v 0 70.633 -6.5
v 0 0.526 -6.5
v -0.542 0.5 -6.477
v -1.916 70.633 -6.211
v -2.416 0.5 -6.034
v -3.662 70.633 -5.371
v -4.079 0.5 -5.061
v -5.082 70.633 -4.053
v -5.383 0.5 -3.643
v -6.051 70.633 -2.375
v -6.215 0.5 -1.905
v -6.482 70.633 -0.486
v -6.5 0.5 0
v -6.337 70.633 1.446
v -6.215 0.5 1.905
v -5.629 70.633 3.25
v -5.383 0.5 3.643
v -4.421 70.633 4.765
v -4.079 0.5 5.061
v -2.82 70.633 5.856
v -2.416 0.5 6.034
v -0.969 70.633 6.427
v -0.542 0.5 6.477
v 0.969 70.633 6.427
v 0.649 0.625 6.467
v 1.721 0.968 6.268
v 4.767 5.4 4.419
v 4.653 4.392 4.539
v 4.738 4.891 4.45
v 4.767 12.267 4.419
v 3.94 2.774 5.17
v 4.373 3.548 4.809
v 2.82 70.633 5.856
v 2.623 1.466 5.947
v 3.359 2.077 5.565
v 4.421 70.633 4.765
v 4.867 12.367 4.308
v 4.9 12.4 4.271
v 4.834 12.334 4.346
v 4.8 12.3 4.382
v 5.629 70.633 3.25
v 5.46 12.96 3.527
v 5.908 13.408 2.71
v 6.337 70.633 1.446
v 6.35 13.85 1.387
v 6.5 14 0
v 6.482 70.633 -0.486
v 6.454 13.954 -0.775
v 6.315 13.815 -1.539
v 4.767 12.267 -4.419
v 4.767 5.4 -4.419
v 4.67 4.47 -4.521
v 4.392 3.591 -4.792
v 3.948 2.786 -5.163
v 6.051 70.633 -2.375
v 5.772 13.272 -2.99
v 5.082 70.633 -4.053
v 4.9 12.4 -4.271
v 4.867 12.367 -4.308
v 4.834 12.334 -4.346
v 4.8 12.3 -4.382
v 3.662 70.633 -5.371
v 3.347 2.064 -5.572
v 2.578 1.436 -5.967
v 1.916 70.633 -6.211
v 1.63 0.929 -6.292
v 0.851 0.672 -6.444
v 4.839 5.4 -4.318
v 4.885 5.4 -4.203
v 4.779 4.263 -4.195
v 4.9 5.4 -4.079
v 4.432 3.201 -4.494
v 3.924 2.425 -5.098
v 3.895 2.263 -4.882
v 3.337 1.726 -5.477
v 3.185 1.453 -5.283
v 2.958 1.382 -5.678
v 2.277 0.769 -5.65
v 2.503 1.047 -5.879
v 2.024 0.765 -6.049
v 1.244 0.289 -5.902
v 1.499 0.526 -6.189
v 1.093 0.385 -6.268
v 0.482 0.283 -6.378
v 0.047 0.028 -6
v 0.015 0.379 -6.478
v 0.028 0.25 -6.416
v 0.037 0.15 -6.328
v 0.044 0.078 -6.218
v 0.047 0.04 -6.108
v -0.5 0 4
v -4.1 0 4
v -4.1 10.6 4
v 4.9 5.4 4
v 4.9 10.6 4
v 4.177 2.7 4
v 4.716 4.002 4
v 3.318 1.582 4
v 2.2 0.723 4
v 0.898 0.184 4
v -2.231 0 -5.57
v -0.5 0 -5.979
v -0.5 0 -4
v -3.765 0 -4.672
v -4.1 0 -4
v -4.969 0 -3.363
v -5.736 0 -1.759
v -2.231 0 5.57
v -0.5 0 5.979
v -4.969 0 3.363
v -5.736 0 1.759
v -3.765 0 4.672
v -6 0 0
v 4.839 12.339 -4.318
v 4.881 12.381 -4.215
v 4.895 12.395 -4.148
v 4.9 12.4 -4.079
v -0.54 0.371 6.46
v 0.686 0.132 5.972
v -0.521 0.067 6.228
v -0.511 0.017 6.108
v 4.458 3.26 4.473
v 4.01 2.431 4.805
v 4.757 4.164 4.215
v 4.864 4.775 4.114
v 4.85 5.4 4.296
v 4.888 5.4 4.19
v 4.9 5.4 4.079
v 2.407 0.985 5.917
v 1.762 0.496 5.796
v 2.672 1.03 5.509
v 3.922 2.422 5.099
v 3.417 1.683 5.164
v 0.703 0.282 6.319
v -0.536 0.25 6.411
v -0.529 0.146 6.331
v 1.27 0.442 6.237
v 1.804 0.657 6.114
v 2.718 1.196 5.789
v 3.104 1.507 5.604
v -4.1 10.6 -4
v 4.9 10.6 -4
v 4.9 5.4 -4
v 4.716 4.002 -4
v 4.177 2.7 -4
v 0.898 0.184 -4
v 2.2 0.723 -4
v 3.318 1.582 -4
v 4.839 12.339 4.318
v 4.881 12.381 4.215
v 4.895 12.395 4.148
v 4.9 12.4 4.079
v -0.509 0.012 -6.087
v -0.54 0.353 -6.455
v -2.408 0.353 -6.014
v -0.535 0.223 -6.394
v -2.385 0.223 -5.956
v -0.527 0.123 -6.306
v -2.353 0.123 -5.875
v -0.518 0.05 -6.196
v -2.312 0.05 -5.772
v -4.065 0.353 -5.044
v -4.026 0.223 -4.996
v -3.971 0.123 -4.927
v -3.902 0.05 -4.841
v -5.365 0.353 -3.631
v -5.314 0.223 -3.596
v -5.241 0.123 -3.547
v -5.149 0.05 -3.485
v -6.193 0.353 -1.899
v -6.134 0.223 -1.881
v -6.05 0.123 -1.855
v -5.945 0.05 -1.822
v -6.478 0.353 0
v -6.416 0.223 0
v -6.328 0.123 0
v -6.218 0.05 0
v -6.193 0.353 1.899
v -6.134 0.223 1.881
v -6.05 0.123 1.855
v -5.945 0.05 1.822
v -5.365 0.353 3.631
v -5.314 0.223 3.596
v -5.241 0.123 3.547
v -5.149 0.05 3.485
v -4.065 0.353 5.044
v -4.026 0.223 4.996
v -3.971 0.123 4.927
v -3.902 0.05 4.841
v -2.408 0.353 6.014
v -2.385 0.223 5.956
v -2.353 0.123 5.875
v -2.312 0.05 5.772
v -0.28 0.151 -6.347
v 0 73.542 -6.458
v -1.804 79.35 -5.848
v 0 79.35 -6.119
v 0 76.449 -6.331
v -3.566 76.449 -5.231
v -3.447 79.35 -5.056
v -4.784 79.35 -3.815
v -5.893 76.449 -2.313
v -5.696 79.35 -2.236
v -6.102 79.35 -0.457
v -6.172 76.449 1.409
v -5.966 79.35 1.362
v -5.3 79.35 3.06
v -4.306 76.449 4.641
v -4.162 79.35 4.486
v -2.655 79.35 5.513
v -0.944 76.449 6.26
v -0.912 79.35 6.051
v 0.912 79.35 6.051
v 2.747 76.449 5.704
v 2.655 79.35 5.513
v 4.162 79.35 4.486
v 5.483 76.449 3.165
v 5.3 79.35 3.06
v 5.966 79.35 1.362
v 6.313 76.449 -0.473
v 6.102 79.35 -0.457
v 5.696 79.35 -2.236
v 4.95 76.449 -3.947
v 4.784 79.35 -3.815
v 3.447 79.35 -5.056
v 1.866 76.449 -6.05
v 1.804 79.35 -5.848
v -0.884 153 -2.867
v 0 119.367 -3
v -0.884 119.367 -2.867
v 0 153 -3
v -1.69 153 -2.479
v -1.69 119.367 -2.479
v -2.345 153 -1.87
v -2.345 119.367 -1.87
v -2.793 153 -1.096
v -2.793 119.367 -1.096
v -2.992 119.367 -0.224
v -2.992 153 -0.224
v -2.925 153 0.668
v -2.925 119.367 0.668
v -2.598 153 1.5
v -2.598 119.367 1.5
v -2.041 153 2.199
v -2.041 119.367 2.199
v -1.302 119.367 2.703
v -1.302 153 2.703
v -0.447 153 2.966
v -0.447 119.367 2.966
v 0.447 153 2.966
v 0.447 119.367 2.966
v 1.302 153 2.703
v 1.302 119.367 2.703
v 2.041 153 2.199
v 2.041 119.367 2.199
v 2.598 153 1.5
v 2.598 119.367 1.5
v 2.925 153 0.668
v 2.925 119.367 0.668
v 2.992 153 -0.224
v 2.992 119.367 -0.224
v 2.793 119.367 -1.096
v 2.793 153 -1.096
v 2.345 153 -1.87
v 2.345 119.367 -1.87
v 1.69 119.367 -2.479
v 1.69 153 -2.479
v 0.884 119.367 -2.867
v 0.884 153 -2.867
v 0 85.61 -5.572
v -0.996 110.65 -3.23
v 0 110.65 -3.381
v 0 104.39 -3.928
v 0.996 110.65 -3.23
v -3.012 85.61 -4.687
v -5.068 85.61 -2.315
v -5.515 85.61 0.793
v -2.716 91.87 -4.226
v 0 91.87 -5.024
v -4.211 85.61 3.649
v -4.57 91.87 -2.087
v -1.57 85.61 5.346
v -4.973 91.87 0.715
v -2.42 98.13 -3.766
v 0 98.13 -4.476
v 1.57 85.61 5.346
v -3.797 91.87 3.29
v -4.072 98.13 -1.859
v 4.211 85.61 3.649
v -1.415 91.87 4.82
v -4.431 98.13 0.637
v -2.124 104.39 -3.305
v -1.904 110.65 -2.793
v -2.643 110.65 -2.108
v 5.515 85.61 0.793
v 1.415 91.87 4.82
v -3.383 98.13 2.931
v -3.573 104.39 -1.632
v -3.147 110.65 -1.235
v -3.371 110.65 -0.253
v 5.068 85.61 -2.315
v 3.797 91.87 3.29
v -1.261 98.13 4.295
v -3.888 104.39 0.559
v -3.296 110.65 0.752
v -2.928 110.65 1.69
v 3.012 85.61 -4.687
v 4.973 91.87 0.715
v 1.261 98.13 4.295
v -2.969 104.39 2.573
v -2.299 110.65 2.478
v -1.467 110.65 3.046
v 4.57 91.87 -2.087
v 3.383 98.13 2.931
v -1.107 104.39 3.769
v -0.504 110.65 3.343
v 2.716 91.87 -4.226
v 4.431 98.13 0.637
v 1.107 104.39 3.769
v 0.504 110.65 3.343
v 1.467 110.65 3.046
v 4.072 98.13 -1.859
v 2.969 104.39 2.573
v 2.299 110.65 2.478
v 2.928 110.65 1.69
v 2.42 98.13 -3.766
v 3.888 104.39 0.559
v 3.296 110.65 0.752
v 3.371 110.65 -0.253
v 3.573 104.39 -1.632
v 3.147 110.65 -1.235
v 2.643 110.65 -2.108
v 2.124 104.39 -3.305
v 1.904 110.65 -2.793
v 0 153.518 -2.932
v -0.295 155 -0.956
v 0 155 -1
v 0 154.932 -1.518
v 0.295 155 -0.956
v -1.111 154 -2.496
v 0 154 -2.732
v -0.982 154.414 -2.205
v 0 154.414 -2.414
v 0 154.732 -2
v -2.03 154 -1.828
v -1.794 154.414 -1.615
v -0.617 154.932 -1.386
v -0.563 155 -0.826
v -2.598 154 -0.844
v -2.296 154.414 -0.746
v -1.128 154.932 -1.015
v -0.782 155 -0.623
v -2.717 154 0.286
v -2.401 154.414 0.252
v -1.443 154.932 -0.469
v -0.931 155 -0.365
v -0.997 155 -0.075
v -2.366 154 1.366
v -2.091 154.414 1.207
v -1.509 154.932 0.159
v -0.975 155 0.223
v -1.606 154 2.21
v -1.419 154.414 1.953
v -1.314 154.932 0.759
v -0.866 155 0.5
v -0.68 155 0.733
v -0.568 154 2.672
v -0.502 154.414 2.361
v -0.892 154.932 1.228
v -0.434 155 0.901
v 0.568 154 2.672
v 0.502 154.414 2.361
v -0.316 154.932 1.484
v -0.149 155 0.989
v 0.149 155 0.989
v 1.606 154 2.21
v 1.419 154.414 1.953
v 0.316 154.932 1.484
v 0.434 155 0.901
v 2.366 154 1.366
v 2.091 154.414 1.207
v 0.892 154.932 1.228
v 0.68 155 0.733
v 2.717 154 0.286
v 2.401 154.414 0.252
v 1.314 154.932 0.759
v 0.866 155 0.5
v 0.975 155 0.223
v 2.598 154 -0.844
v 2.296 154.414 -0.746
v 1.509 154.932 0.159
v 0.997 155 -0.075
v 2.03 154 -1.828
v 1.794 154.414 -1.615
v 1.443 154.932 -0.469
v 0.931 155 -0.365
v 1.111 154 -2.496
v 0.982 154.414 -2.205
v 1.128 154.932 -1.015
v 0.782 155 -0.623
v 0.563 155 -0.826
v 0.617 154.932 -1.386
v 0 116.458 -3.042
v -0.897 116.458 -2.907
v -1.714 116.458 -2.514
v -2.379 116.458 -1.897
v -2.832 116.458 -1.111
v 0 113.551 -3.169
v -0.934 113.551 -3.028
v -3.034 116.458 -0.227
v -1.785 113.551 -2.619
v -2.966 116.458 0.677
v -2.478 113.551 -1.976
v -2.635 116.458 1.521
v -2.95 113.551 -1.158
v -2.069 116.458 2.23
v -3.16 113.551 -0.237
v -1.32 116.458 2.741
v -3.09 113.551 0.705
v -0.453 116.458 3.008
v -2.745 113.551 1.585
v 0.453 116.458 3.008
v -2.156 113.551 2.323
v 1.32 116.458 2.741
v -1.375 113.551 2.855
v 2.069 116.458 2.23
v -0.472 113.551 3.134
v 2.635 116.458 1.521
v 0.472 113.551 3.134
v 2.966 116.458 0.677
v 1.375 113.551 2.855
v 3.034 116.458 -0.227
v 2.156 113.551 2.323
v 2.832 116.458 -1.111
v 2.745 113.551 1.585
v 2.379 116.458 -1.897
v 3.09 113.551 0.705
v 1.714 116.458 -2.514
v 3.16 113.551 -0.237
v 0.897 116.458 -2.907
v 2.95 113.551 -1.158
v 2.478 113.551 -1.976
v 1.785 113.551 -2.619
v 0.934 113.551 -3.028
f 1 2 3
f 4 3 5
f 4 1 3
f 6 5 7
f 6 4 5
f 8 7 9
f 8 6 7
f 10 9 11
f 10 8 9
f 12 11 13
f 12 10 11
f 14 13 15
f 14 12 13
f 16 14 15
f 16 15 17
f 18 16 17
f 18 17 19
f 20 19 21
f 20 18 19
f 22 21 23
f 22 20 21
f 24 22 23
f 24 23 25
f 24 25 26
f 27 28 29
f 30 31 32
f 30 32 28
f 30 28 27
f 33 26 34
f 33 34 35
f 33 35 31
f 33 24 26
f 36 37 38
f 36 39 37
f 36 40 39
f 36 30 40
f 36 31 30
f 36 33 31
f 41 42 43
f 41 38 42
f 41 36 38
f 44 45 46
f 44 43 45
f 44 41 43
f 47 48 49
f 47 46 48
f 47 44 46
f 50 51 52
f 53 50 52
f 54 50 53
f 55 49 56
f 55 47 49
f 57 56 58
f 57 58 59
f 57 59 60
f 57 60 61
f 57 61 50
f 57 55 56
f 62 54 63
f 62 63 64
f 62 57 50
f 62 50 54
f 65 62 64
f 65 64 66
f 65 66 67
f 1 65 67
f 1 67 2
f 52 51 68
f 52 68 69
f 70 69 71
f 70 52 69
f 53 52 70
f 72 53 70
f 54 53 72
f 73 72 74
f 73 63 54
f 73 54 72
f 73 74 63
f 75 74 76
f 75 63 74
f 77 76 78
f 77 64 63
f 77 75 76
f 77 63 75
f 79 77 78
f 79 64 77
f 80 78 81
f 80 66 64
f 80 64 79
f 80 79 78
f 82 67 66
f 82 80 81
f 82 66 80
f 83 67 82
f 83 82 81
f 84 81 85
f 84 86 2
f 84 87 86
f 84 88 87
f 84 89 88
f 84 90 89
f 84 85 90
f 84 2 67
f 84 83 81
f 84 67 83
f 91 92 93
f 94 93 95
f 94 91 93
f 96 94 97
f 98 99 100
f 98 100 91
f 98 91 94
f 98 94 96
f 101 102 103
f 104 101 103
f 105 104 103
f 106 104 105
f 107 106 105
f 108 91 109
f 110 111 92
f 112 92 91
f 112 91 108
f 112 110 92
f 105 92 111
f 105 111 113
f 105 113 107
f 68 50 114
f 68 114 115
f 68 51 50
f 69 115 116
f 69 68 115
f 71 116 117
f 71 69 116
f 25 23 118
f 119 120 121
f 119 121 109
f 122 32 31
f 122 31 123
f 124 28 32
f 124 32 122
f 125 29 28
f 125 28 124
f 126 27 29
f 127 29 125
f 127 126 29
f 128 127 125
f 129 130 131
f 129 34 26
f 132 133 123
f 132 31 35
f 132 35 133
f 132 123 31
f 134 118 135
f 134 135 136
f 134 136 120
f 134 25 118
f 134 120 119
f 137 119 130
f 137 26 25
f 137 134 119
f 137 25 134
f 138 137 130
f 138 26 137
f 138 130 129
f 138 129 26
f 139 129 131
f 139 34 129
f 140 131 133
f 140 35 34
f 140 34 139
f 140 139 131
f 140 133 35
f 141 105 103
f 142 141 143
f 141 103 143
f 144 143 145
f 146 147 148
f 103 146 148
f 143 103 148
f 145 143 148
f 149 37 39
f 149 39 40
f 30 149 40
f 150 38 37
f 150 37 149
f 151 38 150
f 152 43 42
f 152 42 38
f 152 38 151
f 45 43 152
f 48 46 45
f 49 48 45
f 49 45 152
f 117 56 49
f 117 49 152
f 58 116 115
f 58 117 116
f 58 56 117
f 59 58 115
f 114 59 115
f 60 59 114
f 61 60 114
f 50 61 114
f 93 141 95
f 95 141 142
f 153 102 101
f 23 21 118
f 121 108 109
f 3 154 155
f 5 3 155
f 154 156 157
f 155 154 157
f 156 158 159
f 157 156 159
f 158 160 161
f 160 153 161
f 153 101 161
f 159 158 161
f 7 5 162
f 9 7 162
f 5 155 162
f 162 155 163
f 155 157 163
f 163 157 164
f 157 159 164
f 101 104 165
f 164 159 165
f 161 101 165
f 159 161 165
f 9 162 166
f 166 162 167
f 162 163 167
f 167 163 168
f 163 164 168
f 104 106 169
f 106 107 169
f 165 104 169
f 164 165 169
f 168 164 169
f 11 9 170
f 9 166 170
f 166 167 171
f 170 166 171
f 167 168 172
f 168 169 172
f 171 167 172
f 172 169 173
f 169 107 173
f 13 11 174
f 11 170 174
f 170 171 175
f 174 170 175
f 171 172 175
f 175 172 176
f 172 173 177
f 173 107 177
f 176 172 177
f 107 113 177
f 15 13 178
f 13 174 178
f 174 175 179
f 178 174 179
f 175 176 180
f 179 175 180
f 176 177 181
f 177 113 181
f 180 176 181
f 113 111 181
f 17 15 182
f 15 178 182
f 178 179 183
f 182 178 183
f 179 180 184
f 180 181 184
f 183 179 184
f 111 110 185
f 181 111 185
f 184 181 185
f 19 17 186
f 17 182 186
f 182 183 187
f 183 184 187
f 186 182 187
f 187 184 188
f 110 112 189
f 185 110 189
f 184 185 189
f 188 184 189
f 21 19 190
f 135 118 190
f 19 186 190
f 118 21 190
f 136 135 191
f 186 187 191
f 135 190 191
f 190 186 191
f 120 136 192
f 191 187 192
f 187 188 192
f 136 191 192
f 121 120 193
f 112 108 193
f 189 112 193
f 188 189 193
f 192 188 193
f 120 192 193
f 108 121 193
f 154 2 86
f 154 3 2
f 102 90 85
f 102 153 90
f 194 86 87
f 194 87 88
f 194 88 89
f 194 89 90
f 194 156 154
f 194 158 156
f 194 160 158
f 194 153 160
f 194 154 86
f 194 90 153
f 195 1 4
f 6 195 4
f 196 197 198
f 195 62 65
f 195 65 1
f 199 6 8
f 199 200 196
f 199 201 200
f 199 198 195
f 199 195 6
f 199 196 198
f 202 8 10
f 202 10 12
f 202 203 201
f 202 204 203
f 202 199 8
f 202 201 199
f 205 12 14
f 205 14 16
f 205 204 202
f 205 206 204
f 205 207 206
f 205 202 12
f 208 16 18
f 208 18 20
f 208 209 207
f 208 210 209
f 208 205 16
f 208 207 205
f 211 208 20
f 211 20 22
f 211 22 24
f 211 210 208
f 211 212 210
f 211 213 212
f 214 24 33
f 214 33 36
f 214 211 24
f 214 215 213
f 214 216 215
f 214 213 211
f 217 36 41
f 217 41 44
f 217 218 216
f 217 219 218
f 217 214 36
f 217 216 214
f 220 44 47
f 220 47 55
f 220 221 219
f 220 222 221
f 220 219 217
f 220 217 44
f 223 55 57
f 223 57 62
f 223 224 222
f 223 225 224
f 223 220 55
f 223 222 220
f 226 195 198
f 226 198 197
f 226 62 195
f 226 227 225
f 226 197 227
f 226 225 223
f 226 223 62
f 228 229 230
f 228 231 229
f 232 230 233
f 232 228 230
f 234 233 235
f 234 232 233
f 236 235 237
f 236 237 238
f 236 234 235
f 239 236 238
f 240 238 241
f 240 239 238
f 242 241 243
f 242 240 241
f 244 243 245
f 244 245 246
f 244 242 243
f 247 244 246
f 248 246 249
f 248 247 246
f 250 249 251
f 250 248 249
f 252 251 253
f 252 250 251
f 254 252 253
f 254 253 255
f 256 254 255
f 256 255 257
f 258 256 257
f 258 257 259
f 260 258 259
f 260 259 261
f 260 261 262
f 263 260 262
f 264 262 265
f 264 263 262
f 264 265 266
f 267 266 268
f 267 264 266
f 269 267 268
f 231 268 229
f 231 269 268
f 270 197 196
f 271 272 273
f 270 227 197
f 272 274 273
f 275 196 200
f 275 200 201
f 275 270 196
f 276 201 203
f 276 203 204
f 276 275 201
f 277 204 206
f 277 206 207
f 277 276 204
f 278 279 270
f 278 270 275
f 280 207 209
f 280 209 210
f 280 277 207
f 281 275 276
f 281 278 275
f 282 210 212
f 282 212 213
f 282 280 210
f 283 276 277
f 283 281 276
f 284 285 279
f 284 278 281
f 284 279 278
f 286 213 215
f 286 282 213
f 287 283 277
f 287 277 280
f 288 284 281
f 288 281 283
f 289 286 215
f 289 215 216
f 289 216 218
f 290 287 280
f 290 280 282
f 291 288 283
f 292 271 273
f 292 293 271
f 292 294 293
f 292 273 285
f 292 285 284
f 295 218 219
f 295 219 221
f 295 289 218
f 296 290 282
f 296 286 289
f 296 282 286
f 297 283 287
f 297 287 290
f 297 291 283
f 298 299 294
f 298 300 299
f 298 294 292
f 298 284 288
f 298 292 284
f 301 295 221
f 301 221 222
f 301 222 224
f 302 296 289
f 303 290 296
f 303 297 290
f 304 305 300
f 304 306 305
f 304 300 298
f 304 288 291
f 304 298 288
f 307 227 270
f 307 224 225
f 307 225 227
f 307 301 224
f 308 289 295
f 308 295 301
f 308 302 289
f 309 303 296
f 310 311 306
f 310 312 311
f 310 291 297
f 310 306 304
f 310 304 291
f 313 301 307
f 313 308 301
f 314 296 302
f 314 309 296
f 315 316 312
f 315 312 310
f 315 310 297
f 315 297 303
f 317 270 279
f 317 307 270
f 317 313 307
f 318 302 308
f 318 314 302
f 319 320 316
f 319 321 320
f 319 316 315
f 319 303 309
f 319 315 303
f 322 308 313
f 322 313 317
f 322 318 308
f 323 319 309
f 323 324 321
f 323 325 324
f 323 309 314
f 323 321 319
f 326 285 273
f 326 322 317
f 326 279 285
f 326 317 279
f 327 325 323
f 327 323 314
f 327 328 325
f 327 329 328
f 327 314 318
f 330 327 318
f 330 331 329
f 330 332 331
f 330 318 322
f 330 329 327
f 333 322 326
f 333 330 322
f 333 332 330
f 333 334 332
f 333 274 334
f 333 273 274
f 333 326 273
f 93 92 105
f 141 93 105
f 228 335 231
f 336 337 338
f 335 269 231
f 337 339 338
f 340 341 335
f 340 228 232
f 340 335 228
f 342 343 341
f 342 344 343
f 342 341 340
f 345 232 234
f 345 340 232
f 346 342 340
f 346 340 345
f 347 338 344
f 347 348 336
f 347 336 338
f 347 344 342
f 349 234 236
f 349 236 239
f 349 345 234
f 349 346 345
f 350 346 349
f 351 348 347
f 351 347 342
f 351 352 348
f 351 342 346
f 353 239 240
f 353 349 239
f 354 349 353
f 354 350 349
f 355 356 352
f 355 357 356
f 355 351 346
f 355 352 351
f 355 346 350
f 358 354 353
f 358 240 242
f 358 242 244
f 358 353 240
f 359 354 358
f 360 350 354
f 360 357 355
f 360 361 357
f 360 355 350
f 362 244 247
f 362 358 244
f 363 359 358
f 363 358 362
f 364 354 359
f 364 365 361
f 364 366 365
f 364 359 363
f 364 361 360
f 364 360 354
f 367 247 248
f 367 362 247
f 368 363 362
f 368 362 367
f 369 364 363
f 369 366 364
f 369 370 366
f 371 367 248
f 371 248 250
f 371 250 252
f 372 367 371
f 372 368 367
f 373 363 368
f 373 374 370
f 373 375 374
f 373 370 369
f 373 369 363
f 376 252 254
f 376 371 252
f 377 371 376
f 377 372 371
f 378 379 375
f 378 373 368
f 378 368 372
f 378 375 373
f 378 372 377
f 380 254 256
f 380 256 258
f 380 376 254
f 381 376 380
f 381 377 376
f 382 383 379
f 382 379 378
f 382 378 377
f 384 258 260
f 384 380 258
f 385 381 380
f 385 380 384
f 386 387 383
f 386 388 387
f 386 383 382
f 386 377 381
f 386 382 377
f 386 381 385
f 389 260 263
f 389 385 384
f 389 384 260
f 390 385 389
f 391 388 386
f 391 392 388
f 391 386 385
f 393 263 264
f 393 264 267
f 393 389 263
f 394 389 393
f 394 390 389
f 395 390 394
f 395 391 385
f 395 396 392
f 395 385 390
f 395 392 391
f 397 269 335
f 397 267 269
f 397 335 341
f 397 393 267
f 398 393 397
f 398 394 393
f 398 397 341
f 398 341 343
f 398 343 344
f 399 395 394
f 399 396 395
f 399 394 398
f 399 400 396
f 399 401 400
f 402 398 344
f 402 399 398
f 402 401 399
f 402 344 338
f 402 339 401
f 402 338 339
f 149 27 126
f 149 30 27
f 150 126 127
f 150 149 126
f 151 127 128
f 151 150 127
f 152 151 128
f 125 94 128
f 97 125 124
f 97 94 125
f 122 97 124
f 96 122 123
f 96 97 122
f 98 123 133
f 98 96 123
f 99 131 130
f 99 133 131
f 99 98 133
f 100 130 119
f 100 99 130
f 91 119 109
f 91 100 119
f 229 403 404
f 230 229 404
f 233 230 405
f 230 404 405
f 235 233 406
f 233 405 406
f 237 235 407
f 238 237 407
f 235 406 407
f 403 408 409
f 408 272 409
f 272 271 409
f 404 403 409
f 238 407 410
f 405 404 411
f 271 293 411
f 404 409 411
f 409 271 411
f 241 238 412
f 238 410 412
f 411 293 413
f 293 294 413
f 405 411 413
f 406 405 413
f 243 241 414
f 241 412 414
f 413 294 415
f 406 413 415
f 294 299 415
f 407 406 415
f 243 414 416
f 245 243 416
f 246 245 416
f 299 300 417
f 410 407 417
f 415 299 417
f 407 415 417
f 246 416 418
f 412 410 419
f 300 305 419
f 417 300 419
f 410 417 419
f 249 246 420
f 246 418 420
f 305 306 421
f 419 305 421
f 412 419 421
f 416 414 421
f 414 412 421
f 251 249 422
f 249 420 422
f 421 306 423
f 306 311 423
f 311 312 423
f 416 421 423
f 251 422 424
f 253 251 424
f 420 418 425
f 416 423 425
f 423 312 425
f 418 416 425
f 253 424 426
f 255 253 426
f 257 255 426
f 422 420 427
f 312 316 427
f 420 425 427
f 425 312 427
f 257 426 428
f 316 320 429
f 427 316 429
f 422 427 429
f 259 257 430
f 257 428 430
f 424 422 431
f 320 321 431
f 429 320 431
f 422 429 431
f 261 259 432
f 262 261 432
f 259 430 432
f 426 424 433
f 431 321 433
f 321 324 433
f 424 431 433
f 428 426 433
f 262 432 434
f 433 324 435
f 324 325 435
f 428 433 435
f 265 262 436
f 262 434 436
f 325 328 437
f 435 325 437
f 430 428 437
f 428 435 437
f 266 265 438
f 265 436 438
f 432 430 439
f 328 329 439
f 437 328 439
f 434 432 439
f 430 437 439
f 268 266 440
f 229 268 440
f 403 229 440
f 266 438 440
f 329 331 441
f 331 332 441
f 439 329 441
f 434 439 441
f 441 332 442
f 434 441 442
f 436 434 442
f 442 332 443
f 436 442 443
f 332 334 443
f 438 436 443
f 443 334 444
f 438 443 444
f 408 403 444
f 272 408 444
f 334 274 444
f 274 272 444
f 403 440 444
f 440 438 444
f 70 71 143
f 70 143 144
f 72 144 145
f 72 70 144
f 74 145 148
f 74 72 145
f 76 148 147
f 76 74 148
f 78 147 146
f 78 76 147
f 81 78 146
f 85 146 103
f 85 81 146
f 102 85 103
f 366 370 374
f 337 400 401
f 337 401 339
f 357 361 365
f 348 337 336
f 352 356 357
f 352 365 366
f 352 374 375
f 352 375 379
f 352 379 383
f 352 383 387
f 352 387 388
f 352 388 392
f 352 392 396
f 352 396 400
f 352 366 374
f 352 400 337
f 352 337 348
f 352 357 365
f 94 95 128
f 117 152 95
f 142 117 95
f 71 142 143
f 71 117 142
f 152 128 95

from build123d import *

# Parameters (mm, degrees)
FILLET1_R               = 2
FILLET2_R               = 100
CUT_EXTRUDE1_DEPTH      = 156.272341396
CUT_EXTRUDE1_DEPTH_BACK = 156.272341396
SKETCH3_W               = 11
SKETCH3_H               = 8
CUT_EXTRUDE2_DEPTH      = 10.6
FILLET3_R               = 0.5


with BuildPart() as part:
    # Sketch1 → Revolve1 (revolve)
    with BuildSketch(Plane.XY, mode=Mode.PRIVATE) as revolve1_sk:
        Polygon((6.5, 0), (6.5, 75), (3, 115), (3, 155), (0, 155), (0, 0), align=None)
    revolve(revolve1_sk.sketch.rotate(Axis((0, 0, 0), (0, 1, 0)), 90), axis=Axis((0, 0, 0), (0, 1, 0)))

    # Fillet1
    fillet1_edges = [part.edges().sort_by_distance(p)[0] for p in [
        (0, 155, 3),
    ]]
    fillet(fillet1_edges, radius=FILLET1_R)

    # Fillet2
    # the kernel refuses this fillet: 100 mm, written as the material it adds along each edge
    with BuildSketch(Plane(origin=(0, 115, 0), x_dir=(0, 0, -1), z_dir=(1, 0, 0))) as fillet2_piece_1:
        with BuildLine():
            CenterArc((3 + FILLET2_R, FILLET2_R * 0.0436665788079), FILLET2_R, 180, 5.000644598)
            Line((3 + FILLET2_R * 0.00380628250389, -FILLET2_R * 0.043500371473), (3 - FILLET2_R * 0.016117591846, -FILLET2_R * 0.0452437104786))
            Line((3 - FILLET2_R * 0.016117591846, -FILLET2_R * 0.0452437104786), (3 - FILLET2_R * 0.0199238743499, -FILLET2_R * 0.00174333900562))
            Line((3 - FILLET2_R * 0.0199238743499, -FILLET2_R * 0.00174333900562), (3 - FILLET2_R * 0.02, 0))
            Line((3 - FILLET2_R * 0.02, 0), (3 - FILLET2_R * 0.02, FILLET2_R * 0.0436665788079))
            Line((3 - FILLET2_R * 0.02, FILLET2_R * 0.0436665788079), (3, FILLET2_R * 0.0436665788079))
        make_face()
    revolve(axis=Axis((0, 115, 0), (0, 1, 0)))
    # the kernel refuses this fillet: 100 mm, written as the material it takes off along each edge
    with BuildSketch(Plane(origin=(0, 75, 0), x_dir=(0, 0, -1), z_dir=(1, 0, 0))) as fillet2_2_piece_1:
        with BuildLine():
            CenterArc((6.5 - FILLET2_R, -FILLET2_R * 0.0436665788079), FILLET2_R, 0, 5.000644598)
            Line((6.5, -FILLET2_R * 0.0436665788079), (6.5 + FILLET2_R * 0.02, -FILLET2_R * 0.0436665788079))
            Line((6.5 + FILLET2_R * 0.02, -FILLET2_R * 0.0436665788079), (6.5 + FILLET2_R * 0.02, FILLET2_R * 0.000873331576158))
            Line((6.5 + FILLET2_R * 0.02, FILLET2_R * 0.000873331576158), (6.5 + FILLET2_R * 0.016117591846, FILLET2_R * 0.0452437104786))
            Line((6.5 + FILLET2_R * 0.016117591846, FILLET2_R * 0.0452437104786), (6.5 - FILLET2_R * 0.00380628250389, FILLET2_R * 0.043500371473))
        make_face()
    revolve(axis=Axis((0, 75, 0), (0, 1, 0)), mode=Mode.SUBTRACT)

    # Sketch2 → Cut-Extrude1 (cut, two sides: drawn at the far end of the back side and taken through both)
    with BuildSketch(Plane.XY.offset(-CUT_EXTRUDE1_DEPTH_BACK)):
        with BuildLine():
            Line((6.5, 14), (4.9, 12.4))
            Line((4.9, 12.4), (4.9, 5.4))
            ThreePointArc((4.9, 5.4), (3.318376618, 1.581623382), (-0.5, 0))
            Line((-0.5, 0), (6.5, 0))
            Line((6.5, 0), (6.5, 14))
        make_face()
    extrude(amount=CUT_EXTRUDE1_DEPTH + CUT_EXTRUDE1_DEPTH_BACK, mode=Mode.SUBTRACT)

    # Sketch3 → Cut-Extrude2 (cut)
    with BuildSketch(Plane(origin=(0, 0, 0), x_dir=(1, 0, 0), z_dir=(0, 1, 0))):
        with Locations((1.4, 0)):
            Rectangle(SKETCH3_W, SKETCH3_H)
    extrude(amount=CUT_EXTRUDE2_DEPTH, mode=Mode.SUBTRACT)

    # Fillet3
    fillet3_edges = [part.edges().sort_by_distance(p)[0] for p in [
        (-6.5, 0, 0),
        (3.349776633, 1.613283763, 5.570367722),
        (3.507900773, 1.781059372, -5.47216888),
        (4.9, 8.9, -4.270831301),
        (4.9, 8.9, 4.270831301),
    ]]
    fillet(fillet3_edges, radius=FILLET3_R)


solid = part.part
